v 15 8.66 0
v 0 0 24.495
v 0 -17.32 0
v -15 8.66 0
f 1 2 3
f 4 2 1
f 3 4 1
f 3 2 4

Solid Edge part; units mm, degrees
sketch "Sketch1" plane through (0, 0, 0) normal (0, 0, 1) x (1, 0, 0)
  line L0 (-15, 8.6603) -> (0, -17.3205)
  line L1 (0, -17.3205) -> (15, 8.6603)
  line L2 (15, 8.6603) -> (-15, 8.6603)
extrude "Protrusion1" add sketch "Sketch1" along normal up to vertex (24.4949 mm away)
sketch "Sketch2" plane through (0, 0, 0) normal (1, 0, 0) x (0, 1, 0)
  line L0 (8.6603, 24.4949) -> (0, 24.4949)
  line L1 (0, 24.4949) -> (8.6603, 0)
  line L2 (8.6603, 0) -> (8.6603, 24.4949)
extrude "Cutout1" cut sketch "Sketch2" along normal mid plane 30
pattern_circular "Pattern1" count 3 over 360 about axis through (0, 0, 24.4949) along (0, 0, 1) of "Cutout1"
